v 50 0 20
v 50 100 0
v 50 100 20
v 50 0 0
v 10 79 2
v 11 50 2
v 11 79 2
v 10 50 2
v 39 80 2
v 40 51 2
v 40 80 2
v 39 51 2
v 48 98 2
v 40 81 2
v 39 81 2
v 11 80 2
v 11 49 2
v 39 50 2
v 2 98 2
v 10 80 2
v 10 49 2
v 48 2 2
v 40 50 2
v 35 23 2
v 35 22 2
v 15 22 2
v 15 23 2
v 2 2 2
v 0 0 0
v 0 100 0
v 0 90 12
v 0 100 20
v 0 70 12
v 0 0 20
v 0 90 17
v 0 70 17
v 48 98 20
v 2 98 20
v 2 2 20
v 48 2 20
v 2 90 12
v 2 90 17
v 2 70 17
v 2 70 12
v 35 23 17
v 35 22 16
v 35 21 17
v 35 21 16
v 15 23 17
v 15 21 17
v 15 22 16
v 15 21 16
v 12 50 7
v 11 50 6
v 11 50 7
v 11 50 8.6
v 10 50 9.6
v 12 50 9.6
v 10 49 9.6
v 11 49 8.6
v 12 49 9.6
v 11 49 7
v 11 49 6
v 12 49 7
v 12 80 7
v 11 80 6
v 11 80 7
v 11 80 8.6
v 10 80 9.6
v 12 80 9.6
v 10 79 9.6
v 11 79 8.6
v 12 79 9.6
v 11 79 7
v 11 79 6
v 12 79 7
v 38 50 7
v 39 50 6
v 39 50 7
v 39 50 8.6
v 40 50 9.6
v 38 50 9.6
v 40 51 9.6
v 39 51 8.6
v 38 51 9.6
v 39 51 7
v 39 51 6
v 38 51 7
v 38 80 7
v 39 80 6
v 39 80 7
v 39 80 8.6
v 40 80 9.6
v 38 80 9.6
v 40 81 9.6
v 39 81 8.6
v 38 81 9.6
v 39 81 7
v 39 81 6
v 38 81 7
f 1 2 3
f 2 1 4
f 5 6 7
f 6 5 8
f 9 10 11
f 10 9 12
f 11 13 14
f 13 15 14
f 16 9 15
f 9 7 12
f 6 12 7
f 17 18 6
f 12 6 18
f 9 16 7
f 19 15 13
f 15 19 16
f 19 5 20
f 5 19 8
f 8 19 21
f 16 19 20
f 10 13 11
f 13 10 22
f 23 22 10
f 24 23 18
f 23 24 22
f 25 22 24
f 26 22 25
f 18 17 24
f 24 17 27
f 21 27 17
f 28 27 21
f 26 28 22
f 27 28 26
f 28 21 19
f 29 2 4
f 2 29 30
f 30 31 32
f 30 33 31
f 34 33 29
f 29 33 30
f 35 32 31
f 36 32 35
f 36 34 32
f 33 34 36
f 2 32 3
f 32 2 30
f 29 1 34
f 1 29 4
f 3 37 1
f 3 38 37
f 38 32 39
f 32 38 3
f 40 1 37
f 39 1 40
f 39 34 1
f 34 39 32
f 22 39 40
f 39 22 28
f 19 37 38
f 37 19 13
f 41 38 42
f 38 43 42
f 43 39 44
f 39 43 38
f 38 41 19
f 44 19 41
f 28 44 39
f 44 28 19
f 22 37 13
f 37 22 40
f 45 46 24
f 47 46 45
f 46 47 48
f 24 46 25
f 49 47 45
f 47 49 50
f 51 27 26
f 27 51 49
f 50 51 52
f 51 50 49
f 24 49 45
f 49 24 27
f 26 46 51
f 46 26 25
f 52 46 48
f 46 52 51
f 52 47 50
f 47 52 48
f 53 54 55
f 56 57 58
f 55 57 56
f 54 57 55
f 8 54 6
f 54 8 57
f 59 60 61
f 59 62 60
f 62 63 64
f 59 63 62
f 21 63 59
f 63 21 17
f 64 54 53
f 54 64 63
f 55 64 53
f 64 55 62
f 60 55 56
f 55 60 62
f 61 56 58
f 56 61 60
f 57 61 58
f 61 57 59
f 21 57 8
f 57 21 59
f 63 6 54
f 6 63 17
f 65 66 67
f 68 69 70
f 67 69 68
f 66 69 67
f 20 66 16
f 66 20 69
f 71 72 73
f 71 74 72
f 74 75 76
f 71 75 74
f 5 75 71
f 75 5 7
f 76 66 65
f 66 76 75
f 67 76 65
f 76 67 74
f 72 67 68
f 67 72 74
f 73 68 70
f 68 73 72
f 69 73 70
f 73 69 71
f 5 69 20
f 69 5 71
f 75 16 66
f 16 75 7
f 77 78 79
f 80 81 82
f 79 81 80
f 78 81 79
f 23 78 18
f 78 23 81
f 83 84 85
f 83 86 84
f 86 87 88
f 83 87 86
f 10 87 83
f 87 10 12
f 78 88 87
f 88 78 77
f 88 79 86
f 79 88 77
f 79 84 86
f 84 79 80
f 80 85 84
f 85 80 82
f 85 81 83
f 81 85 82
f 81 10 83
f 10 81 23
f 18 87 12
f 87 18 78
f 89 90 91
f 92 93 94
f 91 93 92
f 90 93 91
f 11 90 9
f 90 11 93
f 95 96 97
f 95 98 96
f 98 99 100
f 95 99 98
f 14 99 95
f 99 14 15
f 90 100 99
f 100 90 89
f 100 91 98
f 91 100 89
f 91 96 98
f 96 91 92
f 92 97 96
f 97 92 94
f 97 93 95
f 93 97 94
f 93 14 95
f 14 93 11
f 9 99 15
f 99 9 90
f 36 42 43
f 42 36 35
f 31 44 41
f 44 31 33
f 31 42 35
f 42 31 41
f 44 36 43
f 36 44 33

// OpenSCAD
// Overall box dimensions
x = 50; // m
y = 100;  // mm
z =20;   // mm
th = 2;  // mm
ex = 0.1; // mm extra length to add make sure subtractions work ok.

// 9V battery clip
batt_w = 15; // mm  battery size
batt_d = 20; // mm  battery size
batt_x = 0;  // mm  battery position
batt_y = 0;  // mm  battery position
clip_w = 20; // mm  battery clip
clip_th = 1; // mm 
clip_tab = 1; // mm

// Slot for SD Card
sd_z = 10+th;     // sd card slot location z
sd_w = 20;     //width of sd card slot
sd_h = 5;      // depth of sd card slot
sd_x = 0;      // sd card slot location x
sd_y = y-sd_w-10;     // sd card slot location y


module boardClip(h) {
	board_th = 1.6; //mm
	boardClip_th = 1.0;  // mm
	boardClip_tab = 1;  // mm
	rotate([90,0,0]) {
		linear_extrude(height=boardClip_th)
			polygon(points=[
								[0,0], 
								[0,h+board_th+boardClip_tab],
								[boardClip_th+boardClip_tab,h+board_th+boardClip_tab],
								[boardClip_th,h+board_th],
								[boardClip_th,h],
								[boardClip_th+boardClip_tab,h],
								[boardClip_th,h-boardClip_tab],
								[boardClip_th,0]
			]);
	}
}


difference() {
	union() {
		// base and walls.
		color("red") cube([x,y,th]);
		color("blue") translate([0,0,0]) cube([x,th,z]);
		color("blue") translate([0,y-th,0]) cube([x,th,z]);
		color("yellow") translate([0,0,0]) cube([th,y,z]);
		color("yellow") translate([x-th,0,0]) cube([th,y,z]);
		// battery clip
		color("green") translate([x/2-clip_w/2,batt_y+th+batt_d,th]) cube([clip_w,clip_th,batt_w]);
		color("green") translate([x/2-clip_w/2,batt_y+batt_d+clip_th,clip_th+batt_w]) cube([clip_w,clip_tab+clip_th,clip_th]);
		translate([10,50,th]) boardClip(5);
		translate([10,80,th]) boardClip(5);
		translate([40,50,th]) rotate([0,0,180]) boardClip(5);
		translate([40,80,th]) rotate([0,0,180]) boardClip(5);
	}
	//cut-outs
	union() {
		// sd card slot.
		color("blue") translate([sd_x-ex,sd_y,sd_z]) cube([th+2*ex,sd_w,sd_h]);
	}
}
